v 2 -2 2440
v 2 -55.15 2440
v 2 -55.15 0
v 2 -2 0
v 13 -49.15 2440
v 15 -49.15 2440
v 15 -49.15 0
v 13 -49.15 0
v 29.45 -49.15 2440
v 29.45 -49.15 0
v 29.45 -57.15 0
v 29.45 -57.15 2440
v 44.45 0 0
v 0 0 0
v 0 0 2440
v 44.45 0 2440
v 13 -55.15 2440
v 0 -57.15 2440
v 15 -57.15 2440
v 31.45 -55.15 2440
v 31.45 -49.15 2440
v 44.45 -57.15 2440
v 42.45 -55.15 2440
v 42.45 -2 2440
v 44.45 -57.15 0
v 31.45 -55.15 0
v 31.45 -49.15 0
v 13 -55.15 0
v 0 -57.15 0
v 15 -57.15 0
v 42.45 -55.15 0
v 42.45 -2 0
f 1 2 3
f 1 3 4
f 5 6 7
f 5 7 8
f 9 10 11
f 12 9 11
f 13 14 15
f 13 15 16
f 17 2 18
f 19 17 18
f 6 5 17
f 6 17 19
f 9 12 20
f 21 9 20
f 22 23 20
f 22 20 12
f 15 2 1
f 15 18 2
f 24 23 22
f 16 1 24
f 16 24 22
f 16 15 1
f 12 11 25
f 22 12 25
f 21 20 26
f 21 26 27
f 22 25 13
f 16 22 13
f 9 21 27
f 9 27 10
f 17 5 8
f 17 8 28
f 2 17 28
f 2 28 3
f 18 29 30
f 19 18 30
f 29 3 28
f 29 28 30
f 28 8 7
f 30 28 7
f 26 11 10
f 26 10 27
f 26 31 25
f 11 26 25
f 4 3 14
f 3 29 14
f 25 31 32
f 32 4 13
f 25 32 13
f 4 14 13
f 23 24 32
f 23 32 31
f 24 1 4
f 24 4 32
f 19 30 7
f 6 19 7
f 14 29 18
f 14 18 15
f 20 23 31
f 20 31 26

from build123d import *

# Parameters (mm, degrees)
CROQUIS1_W              = 44.45
CROQUIS1_H              = 57.15
SALIENTE_EXTRUIR1_DEPTH = 2440
CORTAR_EXTRUIR1_DEPTH   = 2440


with BuildPart() as part:
    # Croquis1 → Saliente-Extruir1 (new body)
    with BuildSketch(Plane.XY):
        with Locations((22.225, -28.575)):
            Rectangle(CROQUIS1_W, CROQUIS1_H)
    extrude(amount=SALIENTE_EXTRUIR1_DEPTH)

    # Croquis2 → Cortar-Extruir1 (cut)
    with BuildSketch(Plane.XY.offset(2440)):
        Polygon((15, -57.15), (15, -49.15), (13, -49.15), (13, -55.15), (2, -55.15), (2, -2), (42.45, -2), (42.45, -55.15), (31.45, -55.15), (31.45, -49.15), (29.45, -49.15), (29.45, -57.15), align=None)
    extrude(amount=-CORTAR_EXTRUIR1_DEPTH, mode=Mode.SUBTRACT)


solid = part.part
